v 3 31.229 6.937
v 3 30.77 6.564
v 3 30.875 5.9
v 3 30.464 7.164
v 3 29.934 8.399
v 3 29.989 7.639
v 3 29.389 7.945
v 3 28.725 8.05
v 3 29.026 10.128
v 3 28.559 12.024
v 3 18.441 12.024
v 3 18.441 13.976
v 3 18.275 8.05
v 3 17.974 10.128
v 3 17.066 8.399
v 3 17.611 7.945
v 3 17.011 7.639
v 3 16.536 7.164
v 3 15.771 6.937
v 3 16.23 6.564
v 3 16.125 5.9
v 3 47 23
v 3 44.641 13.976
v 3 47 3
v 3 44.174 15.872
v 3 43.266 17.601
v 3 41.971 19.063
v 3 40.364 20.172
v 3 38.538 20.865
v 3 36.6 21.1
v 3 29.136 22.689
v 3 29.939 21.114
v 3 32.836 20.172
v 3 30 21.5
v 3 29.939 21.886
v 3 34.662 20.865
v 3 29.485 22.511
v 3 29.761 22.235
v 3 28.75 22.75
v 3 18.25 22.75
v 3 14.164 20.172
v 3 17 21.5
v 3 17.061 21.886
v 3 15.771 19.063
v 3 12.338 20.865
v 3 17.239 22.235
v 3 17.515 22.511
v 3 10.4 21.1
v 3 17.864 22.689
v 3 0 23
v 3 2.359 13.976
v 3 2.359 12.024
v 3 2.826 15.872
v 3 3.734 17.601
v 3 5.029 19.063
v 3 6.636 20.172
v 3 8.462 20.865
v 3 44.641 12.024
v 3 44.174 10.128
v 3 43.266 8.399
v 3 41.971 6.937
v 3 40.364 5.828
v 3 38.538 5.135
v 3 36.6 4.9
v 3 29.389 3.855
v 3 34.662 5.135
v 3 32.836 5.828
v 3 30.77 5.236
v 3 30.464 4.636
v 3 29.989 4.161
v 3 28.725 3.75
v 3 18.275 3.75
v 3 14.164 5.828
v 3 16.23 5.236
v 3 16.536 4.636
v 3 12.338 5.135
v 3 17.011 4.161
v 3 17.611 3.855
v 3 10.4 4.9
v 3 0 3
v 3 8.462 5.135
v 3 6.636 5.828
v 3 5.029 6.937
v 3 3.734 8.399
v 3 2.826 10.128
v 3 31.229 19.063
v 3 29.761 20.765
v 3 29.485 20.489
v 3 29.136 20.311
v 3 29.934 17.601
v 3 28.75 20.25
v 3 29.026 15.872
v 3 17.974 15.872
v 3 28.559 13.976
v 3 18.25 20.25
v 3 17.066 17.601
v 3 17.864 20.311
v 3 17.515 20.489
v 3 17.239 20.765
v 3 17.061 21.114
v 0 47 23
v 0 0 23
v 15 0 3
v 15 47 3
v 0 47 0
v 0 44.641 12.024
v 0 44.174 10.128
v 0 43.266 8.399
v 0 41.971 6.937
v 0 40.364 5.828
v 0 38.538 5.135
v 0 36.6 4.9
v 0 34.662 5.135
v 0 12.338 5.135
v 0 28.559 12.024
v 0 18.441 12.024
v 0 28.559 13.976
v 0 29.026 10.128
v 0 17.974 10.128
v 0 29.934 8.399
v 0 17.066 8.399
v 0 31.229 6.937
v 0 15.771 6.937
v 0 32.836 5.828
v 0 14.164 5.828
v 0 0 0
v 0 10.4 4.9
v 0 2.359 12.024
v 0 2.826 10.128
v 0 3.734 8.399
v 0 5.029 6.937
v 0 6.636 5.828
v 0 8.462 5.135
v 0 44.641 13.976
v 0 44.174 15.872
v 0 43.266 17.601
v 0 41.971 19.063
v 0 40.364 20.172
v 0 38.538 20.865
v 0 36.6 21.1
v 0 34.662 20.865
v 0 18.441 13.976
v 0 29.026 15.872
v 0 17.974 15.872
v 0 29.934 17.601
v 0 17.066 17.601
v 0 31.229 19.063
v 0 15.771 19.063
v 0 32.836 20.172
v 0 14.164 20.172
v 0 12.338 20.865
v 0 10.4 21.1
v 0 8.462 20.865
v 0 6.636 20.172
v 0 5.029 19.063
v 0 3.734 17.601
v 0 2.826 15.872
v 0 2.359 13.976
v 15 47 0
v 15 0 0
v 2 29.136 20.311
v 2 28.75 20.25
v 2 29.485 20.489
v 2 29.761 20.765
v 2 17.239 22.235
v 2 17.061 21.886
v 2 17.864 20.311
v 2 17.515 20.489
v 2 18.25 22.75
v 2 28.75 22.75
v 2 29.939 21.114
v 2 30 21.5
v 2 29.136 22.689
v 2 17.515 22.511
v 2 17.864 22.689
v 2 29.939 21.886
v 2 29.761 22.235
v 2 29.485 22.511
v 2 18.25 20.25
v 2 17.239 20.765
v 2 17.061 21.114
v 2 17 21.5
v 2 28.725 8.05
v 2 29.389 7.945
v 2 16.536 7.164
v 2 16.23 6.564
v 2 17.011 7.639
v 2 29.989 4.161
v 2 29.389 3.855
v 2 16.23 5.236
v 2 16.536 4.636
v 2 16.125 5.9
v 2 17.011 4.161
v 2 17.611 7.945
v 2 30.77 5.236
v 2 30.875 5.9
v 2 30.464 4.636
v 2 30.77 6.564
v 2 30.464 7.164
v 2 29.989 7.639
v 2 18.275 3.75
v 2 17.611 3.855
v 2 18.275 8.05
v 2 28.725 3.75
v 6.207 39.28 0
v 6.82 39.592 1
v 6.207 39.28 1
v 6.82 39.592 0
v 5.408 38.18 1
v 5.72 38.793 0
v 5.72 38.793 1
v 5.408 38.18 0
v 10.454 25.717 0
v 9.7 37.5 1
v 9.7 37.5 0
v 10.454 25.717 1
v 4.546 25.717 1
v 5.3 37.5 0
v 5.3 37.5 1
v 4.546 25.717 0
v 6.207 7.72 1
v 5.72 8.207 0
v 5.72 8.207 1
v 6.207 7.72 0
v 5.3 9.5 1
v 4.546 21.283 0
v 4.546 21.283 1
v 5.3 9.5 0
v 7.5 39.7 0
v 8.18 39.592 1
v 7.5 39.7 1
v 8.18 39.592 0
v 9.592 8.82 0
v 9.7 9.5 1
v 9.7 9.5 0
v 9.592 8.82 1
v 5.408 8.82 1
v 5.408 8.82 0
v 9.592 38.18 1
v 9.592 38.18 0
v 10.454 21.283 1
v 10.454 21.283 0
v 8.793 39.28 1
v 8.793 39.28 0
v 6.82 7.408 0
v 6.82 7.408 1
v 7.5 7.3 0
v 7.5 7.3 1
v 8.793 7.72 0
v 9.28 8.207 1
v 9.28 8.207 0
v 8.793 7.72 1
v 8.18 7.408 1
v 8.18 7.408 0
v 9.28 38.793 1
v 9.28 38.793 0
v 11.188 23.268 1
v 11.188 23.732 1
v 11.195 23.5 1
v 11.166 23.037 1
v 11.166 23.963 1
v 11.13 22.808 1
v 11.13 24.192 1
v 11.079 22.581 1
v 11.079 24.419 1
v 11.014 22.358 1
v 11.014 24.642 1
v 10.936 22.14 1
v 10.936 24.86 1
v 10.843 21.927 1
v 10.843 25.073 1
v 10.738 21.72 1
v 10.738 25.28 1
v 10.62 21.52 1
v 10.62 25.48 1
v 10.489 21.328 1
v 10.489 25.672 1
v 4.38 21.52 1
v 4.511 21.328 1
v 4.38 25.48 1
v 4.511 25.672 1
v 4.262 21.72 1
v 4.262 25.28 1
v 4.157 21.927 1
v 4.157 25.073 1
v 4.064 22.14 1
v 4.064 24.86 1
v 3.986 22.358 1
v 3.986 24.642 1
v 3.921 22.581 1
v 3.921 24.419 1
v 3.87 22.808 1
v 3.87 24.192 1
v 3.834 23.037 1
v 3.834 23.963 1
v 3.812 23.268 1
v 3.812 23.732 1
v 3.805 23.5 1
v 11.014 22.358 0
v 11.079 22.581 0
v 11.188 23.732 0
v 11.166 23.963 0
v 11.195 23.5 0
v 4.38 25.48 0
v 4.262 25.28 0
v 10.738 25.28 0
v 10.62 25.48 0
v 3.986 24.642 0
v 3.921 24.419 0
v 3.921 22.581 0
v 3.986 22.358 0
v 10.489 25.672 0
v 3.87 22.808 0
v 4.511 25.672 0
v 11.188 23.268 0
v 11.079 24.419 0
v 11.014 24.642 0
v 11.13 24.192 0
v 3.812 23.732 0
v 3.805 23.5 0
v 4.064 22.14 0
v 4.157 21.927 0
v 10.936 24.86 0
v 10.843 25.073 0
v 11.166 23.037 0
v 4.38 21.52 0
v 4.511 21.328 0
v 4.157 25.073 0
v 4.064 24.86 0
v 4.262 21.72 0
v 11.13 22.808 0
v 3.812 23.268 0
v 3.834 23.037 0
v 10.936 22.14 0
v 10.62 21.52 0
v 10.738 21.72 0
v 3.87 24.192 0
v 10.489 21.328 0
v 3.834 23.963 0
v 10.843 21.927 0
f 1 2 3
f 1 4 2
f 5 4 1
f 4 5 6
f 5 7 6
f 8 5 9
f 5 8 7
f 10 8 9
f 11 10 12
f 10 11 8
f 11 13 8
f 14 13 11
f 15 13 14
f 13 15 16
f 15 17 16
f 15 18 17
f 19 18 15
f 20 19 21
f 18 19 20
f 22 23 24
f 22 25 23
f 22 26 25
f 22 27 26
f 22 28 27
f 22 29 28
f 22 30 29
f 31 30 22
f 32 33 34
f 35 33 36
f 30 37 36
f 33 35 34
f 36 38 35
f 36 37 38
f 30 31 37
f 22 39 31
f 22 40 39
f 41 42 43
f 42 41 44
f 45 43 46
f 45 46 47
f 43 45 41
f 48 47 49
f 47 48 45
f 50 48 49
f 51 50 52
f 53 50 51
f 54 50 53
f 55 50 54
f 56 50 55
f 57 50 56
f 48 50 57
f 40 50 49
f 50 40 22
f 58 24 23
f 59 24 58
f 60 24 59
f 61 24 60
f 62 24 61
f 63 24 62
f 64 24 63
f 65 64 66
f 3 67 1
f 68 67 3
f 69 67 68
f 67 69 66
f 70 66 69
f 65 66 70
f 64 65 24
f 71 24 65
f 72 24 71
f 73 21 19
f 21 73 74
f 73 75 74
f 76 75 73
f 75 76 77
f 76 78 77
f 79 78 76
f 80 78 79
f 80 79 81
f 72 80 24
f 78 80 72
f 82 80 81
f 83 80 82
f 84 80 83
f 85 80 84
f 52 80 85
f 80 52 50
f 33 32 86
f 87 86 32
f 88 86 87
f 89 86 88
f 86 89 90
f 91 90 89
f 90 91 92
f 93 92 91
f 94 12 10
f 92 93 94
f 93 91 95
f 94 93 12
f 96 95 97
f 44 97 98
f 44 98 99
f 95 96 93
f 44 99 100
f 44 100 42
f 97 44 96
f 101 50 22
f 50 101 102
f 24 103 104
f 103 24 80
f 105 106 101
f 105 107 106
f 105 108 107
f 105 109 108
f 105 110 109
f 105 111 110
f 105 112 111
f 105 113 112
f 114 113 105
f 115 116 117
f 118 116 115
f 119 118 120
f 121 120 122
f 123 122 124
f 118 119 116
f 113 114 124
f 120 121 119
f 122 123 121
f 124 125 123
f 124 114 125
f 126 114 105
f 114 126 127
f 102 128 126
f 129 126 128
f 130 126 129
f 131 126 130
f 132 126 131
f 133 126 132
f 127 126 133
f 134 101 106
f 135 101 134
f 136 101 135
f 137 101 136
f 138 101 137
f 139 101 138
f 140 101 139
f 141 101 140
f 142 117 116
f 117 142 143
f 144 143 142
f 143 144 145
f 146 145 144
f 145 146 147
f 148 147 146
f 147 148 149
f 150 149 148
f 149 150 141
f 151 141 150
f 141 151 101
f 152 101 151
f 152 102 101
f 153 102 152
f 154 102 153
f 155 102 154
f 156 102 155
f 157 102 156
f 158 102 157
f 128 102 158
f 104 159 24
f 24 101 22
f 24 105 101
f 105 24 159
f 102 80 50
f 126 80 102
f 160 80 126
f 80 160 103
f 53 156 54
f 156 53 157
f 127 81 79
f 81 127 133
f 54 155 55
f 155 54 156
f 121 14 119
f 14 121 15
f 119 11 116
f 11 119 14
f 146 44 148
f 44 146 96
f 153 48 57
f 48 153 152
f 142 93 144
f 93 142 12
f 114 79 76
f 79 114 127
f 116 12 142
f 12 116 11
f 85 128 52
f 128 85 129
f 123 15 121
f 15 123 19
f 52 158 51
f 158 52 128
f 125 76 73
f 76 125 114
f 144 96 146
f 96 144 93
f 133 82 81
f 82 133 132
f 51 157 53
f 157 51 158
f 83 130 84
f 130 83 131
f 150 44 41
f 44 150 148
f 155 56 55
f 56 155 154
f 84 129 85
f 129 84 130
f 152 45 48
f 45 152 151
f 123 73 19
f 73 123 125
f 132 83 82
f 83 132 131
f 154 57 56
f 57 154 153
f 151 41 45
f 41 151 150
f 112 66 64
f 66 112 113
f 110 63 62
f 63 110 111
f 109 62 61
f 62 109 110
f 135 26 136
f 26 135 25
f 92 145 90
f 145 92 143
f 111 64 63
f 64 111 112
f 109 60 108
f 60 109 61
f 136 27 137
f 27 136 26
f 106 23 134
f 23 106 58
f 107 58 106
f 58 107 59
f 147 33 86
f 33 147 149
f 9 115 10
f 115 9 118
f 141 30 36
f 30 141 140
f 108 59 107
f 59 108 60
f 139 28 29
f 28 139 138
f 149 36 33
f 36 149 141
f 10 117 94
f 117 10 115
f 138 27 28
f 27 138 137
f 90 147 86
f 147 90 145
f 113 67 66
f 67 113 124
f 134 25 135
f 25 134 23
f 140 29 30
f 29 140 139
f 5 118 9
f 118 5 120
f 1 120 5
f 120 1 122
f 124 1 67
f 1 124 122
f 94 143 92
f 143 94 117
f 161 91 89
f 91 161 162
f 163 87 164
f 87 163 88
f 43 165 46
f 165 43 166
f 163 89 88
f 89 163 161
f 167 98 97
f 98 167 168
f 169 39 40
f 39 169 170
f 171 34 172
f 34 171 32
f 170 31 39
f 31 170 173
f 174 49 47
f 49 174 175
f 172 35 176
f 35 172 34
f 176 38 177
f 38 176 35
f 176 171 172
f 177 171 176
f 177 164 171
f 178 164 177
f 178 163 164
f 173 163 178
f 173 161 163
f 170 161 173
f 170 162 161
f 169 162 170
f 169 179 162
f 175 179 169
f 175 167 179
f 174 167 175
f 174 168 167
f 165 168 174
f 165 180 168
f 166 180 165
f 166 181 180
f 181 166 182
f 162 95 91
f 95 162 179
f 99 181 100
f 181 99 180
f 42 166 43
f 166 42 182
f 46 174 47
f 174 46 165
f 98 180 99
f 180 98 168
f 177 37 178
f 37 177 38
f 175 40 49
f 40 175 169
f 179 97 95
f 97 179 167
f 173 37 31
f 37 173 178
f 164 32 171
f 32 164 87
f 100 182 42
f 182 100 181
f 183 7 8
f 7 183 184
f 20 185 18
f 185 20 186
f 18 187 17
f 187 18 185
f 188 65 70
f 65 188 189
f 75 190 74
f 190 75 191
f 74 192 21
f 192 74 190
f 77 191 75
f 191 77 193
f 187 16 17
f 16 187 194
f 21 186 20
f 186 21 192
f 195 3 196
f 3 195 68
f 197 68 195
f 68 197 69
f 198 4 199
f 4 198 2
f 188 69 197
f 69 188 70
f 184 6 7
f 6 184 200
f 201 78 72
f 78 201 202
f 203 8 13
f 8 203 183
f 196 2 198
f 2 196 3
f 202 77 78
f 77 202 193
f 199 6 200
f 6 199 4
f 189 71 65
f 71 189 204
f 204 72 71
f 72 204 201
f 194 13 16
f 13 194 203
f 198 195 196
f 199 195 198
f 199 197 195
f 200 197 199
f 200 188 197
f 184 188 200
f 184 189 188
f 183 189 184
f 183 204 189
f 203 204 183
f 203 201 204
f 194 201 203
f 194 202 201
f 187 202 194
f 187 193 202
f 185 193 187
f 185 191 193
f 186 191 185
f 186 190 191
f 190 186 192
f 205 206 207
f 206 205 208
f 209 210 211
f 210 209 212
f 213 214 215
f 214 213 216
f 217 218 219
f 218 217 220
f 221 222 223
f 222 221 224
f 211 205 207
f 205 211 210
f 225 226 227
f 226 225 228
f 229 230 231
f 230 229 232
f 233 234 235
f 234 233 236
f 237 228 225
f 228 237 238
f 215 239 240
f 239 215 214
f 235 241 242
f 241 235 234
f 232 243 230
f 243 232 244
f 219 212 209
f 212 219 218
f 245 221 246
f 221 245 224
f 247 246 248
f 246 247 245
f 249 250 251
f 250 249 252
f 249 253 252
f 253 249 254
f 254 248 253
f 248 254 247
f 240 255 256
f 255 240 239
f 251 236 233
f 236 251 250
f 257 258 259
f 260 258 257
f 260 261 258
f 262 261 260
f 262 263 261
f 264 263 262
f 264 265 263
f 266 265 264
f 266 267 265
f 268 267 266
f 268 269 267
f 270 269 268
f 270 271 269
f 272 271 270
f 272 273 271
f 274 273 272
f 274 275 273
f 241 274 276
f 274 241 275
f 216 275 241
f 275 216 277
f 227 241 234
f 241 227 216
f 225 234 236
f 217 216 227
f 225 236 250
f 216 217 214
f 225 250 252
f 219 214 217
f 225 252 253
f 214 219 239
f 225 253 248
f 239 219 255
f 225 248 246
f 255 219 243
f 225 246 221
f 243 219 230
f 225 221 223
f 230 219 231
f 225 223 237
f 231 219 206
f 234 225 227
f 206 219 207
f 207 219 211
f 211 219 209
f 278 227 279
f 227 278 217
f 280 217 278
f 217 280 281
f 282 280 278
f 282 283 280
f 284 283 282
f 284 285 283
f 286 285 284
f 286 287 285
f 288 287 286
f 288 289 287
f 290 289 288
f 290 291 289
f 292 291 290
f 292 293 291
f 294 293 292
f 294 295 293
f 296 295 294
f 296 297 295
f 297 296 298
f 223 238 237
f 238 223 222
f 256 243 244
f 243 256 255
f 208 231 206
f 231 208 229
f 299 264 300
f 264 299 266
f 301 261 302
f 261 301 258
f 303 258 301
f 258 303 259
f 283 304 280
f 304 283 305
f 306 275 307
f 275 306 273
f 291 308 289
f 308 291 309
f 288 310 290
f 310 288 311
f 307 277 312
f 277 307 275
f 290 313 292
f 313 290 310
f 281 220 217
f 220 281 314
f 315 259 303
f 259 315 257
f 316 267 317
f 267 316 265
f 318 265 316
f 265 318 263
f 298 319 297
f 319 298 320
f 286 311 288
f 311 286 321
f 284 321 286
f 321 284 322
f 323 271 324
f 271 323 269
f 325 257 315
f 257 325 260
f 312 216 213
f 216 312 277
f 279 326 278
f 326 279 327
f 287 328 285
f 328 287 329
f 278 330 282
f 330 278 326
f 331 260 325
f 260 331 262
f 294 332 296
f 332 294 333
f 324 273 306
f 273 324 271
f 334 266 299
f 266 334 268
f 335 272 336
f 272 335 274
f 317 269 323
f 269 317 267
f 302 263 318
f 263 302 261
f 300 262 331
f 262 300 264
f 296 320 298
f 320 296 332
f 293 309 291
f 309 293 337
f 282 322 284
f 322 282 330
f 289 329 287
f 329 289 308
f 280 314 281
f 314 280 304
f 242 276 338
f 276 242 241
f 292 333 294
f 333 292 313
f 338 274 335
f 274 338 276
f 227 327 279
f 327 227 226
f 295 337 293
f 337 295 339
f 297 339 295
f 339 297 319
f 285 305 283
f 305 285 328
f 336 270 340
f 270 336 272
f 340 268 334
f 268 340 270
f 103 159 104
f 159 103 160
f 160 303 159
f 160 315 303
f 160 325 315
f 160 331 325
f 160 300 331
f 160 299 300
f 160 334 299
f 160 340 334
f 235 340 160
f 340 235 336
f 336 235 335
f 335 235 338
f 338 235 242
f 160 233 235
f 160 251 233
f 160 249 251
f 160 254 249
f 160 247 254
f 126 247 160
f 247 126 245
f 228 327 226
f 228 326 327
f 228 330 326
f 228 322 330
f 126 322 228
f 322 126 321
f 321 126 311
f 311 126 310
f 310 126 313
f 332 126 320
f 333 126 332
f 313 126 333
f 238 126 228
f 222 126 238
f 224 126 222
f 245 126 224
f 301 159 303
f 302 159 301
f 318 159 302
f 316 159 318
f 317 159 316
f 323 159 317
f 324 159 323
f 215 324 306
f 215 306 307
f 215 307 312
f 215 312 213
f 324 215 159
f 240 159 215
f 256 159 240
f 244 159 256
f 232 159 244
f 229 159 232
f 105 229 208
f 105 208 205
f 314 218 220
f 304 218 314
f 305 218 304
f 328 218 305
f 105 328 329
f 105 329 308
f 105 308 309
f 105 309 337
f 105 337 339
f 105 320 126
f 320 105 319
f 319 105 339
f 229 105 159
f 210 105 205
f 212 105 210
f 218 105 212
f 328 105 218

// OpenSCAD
//Biped_Eyes_v2

//variables
xBase = 15;
yBase = 47;
zBase = 3;

xBack = 3;
yBack = 47;
zBack = 20;

bigHolesD = 16.2;
bigHolesH = xBack+1;
bigHolesMargin = 2.3;

upperHolesD = 2.5;
upperHolesH = (xBack+1)/2;
upperHolesSeparation = 13-upperHolesD;
upperHolesZPosition = 17.25 + upperHolesD/2;

lowerHolesD = 4.3;
lowerHolesH = (xBack+1)/2;
lowerHolesSeparation = 14.75-lowerHolesD;
lowerHolesZPosition = 0.75 + lowerHolesD/2;

bottomBigHoleD = 7.39;
bottomHidenHole = 6.18;
bottomSmallHoleD = 4.4;
bottomHolesSeparation = 32.4-bottomSmallHoleD;
bottomHolesH = (zBase+1)/2;

//modules
module bipedEyes(){
    union(){
        translate([0,0,zBase])
            back();
        base();
    }
}

module back(){
    difference(){
        platform(xBack, yBack, zBack);
        translate([xBack/2,bigHolesMargin+bigHolesD/2,zBack/2])
            bigHoles(bigHolesH, bigHolesD);
        translate([xBack/2,yBack - bigHolesMargin-bigHolesD/2,zBack/2])
            bigHoles(bigHolesH, bigHolesD);
        translate([xBack,yBack/2-upperHolesSeparation/2,upperHolesZPosition])
            strechedHoles(upperHolesH, upperHolesD, upperHolesSeparation);
        translate([xBack,yBack/2-lowerHolesSeparation/2,lowerHolesZPosition])
            strechedHoles(lowerHolesH, lowerHolesD, lowerHolesSeparation);
    }
}

module bigHoles(hh, hd){
    rotate([0,90,0])
                cylinder(h=hh, d=hd, center=true);
}

module strechedHoles(uh, ud, us){    
    hull(){
        rotate([0,90,0])
            cylinder(h=uh, d=ud, center=true, $fn=20);
        translate([0,us,0])
            rotate([0,90,0])
                cylinder(h=uh, d=ud, center=true, $fn=20);
    }       
}

module base(){    
    difference(){
        platform(xBase, yBase, zBase);
        translate([xBase/2,yBase/2-bottomHolesSeparation/2,0])
            bottomHole();
    }
}

module bottomHole(){
    union(){
        hull(){
        cylinder(h=bottomHolesH, d=bottomSmallHoleD, center=true, $fn=20);
        translate([0,bottomHolesSeparation/2,0])
            cylinder(h=bottomHolesH, d=bottomHidenHole, center=true, $fn=100);        
        translate([0,bottomHolesSeparation,0])
            cylinder(h=bottomHolesH, d=bottomSmallHoleD, center=true, $fn=20);
    }
        translate([0,bottomHolesSeparation/2,0])
            cylinder(h=bottomHolesH, d=bottomBigHoleD, center=true, $fn=100);
    }
    
}


module platform(x, y, z){
    cube([x,y,z]);
}

//invocation
bipedEyes();
